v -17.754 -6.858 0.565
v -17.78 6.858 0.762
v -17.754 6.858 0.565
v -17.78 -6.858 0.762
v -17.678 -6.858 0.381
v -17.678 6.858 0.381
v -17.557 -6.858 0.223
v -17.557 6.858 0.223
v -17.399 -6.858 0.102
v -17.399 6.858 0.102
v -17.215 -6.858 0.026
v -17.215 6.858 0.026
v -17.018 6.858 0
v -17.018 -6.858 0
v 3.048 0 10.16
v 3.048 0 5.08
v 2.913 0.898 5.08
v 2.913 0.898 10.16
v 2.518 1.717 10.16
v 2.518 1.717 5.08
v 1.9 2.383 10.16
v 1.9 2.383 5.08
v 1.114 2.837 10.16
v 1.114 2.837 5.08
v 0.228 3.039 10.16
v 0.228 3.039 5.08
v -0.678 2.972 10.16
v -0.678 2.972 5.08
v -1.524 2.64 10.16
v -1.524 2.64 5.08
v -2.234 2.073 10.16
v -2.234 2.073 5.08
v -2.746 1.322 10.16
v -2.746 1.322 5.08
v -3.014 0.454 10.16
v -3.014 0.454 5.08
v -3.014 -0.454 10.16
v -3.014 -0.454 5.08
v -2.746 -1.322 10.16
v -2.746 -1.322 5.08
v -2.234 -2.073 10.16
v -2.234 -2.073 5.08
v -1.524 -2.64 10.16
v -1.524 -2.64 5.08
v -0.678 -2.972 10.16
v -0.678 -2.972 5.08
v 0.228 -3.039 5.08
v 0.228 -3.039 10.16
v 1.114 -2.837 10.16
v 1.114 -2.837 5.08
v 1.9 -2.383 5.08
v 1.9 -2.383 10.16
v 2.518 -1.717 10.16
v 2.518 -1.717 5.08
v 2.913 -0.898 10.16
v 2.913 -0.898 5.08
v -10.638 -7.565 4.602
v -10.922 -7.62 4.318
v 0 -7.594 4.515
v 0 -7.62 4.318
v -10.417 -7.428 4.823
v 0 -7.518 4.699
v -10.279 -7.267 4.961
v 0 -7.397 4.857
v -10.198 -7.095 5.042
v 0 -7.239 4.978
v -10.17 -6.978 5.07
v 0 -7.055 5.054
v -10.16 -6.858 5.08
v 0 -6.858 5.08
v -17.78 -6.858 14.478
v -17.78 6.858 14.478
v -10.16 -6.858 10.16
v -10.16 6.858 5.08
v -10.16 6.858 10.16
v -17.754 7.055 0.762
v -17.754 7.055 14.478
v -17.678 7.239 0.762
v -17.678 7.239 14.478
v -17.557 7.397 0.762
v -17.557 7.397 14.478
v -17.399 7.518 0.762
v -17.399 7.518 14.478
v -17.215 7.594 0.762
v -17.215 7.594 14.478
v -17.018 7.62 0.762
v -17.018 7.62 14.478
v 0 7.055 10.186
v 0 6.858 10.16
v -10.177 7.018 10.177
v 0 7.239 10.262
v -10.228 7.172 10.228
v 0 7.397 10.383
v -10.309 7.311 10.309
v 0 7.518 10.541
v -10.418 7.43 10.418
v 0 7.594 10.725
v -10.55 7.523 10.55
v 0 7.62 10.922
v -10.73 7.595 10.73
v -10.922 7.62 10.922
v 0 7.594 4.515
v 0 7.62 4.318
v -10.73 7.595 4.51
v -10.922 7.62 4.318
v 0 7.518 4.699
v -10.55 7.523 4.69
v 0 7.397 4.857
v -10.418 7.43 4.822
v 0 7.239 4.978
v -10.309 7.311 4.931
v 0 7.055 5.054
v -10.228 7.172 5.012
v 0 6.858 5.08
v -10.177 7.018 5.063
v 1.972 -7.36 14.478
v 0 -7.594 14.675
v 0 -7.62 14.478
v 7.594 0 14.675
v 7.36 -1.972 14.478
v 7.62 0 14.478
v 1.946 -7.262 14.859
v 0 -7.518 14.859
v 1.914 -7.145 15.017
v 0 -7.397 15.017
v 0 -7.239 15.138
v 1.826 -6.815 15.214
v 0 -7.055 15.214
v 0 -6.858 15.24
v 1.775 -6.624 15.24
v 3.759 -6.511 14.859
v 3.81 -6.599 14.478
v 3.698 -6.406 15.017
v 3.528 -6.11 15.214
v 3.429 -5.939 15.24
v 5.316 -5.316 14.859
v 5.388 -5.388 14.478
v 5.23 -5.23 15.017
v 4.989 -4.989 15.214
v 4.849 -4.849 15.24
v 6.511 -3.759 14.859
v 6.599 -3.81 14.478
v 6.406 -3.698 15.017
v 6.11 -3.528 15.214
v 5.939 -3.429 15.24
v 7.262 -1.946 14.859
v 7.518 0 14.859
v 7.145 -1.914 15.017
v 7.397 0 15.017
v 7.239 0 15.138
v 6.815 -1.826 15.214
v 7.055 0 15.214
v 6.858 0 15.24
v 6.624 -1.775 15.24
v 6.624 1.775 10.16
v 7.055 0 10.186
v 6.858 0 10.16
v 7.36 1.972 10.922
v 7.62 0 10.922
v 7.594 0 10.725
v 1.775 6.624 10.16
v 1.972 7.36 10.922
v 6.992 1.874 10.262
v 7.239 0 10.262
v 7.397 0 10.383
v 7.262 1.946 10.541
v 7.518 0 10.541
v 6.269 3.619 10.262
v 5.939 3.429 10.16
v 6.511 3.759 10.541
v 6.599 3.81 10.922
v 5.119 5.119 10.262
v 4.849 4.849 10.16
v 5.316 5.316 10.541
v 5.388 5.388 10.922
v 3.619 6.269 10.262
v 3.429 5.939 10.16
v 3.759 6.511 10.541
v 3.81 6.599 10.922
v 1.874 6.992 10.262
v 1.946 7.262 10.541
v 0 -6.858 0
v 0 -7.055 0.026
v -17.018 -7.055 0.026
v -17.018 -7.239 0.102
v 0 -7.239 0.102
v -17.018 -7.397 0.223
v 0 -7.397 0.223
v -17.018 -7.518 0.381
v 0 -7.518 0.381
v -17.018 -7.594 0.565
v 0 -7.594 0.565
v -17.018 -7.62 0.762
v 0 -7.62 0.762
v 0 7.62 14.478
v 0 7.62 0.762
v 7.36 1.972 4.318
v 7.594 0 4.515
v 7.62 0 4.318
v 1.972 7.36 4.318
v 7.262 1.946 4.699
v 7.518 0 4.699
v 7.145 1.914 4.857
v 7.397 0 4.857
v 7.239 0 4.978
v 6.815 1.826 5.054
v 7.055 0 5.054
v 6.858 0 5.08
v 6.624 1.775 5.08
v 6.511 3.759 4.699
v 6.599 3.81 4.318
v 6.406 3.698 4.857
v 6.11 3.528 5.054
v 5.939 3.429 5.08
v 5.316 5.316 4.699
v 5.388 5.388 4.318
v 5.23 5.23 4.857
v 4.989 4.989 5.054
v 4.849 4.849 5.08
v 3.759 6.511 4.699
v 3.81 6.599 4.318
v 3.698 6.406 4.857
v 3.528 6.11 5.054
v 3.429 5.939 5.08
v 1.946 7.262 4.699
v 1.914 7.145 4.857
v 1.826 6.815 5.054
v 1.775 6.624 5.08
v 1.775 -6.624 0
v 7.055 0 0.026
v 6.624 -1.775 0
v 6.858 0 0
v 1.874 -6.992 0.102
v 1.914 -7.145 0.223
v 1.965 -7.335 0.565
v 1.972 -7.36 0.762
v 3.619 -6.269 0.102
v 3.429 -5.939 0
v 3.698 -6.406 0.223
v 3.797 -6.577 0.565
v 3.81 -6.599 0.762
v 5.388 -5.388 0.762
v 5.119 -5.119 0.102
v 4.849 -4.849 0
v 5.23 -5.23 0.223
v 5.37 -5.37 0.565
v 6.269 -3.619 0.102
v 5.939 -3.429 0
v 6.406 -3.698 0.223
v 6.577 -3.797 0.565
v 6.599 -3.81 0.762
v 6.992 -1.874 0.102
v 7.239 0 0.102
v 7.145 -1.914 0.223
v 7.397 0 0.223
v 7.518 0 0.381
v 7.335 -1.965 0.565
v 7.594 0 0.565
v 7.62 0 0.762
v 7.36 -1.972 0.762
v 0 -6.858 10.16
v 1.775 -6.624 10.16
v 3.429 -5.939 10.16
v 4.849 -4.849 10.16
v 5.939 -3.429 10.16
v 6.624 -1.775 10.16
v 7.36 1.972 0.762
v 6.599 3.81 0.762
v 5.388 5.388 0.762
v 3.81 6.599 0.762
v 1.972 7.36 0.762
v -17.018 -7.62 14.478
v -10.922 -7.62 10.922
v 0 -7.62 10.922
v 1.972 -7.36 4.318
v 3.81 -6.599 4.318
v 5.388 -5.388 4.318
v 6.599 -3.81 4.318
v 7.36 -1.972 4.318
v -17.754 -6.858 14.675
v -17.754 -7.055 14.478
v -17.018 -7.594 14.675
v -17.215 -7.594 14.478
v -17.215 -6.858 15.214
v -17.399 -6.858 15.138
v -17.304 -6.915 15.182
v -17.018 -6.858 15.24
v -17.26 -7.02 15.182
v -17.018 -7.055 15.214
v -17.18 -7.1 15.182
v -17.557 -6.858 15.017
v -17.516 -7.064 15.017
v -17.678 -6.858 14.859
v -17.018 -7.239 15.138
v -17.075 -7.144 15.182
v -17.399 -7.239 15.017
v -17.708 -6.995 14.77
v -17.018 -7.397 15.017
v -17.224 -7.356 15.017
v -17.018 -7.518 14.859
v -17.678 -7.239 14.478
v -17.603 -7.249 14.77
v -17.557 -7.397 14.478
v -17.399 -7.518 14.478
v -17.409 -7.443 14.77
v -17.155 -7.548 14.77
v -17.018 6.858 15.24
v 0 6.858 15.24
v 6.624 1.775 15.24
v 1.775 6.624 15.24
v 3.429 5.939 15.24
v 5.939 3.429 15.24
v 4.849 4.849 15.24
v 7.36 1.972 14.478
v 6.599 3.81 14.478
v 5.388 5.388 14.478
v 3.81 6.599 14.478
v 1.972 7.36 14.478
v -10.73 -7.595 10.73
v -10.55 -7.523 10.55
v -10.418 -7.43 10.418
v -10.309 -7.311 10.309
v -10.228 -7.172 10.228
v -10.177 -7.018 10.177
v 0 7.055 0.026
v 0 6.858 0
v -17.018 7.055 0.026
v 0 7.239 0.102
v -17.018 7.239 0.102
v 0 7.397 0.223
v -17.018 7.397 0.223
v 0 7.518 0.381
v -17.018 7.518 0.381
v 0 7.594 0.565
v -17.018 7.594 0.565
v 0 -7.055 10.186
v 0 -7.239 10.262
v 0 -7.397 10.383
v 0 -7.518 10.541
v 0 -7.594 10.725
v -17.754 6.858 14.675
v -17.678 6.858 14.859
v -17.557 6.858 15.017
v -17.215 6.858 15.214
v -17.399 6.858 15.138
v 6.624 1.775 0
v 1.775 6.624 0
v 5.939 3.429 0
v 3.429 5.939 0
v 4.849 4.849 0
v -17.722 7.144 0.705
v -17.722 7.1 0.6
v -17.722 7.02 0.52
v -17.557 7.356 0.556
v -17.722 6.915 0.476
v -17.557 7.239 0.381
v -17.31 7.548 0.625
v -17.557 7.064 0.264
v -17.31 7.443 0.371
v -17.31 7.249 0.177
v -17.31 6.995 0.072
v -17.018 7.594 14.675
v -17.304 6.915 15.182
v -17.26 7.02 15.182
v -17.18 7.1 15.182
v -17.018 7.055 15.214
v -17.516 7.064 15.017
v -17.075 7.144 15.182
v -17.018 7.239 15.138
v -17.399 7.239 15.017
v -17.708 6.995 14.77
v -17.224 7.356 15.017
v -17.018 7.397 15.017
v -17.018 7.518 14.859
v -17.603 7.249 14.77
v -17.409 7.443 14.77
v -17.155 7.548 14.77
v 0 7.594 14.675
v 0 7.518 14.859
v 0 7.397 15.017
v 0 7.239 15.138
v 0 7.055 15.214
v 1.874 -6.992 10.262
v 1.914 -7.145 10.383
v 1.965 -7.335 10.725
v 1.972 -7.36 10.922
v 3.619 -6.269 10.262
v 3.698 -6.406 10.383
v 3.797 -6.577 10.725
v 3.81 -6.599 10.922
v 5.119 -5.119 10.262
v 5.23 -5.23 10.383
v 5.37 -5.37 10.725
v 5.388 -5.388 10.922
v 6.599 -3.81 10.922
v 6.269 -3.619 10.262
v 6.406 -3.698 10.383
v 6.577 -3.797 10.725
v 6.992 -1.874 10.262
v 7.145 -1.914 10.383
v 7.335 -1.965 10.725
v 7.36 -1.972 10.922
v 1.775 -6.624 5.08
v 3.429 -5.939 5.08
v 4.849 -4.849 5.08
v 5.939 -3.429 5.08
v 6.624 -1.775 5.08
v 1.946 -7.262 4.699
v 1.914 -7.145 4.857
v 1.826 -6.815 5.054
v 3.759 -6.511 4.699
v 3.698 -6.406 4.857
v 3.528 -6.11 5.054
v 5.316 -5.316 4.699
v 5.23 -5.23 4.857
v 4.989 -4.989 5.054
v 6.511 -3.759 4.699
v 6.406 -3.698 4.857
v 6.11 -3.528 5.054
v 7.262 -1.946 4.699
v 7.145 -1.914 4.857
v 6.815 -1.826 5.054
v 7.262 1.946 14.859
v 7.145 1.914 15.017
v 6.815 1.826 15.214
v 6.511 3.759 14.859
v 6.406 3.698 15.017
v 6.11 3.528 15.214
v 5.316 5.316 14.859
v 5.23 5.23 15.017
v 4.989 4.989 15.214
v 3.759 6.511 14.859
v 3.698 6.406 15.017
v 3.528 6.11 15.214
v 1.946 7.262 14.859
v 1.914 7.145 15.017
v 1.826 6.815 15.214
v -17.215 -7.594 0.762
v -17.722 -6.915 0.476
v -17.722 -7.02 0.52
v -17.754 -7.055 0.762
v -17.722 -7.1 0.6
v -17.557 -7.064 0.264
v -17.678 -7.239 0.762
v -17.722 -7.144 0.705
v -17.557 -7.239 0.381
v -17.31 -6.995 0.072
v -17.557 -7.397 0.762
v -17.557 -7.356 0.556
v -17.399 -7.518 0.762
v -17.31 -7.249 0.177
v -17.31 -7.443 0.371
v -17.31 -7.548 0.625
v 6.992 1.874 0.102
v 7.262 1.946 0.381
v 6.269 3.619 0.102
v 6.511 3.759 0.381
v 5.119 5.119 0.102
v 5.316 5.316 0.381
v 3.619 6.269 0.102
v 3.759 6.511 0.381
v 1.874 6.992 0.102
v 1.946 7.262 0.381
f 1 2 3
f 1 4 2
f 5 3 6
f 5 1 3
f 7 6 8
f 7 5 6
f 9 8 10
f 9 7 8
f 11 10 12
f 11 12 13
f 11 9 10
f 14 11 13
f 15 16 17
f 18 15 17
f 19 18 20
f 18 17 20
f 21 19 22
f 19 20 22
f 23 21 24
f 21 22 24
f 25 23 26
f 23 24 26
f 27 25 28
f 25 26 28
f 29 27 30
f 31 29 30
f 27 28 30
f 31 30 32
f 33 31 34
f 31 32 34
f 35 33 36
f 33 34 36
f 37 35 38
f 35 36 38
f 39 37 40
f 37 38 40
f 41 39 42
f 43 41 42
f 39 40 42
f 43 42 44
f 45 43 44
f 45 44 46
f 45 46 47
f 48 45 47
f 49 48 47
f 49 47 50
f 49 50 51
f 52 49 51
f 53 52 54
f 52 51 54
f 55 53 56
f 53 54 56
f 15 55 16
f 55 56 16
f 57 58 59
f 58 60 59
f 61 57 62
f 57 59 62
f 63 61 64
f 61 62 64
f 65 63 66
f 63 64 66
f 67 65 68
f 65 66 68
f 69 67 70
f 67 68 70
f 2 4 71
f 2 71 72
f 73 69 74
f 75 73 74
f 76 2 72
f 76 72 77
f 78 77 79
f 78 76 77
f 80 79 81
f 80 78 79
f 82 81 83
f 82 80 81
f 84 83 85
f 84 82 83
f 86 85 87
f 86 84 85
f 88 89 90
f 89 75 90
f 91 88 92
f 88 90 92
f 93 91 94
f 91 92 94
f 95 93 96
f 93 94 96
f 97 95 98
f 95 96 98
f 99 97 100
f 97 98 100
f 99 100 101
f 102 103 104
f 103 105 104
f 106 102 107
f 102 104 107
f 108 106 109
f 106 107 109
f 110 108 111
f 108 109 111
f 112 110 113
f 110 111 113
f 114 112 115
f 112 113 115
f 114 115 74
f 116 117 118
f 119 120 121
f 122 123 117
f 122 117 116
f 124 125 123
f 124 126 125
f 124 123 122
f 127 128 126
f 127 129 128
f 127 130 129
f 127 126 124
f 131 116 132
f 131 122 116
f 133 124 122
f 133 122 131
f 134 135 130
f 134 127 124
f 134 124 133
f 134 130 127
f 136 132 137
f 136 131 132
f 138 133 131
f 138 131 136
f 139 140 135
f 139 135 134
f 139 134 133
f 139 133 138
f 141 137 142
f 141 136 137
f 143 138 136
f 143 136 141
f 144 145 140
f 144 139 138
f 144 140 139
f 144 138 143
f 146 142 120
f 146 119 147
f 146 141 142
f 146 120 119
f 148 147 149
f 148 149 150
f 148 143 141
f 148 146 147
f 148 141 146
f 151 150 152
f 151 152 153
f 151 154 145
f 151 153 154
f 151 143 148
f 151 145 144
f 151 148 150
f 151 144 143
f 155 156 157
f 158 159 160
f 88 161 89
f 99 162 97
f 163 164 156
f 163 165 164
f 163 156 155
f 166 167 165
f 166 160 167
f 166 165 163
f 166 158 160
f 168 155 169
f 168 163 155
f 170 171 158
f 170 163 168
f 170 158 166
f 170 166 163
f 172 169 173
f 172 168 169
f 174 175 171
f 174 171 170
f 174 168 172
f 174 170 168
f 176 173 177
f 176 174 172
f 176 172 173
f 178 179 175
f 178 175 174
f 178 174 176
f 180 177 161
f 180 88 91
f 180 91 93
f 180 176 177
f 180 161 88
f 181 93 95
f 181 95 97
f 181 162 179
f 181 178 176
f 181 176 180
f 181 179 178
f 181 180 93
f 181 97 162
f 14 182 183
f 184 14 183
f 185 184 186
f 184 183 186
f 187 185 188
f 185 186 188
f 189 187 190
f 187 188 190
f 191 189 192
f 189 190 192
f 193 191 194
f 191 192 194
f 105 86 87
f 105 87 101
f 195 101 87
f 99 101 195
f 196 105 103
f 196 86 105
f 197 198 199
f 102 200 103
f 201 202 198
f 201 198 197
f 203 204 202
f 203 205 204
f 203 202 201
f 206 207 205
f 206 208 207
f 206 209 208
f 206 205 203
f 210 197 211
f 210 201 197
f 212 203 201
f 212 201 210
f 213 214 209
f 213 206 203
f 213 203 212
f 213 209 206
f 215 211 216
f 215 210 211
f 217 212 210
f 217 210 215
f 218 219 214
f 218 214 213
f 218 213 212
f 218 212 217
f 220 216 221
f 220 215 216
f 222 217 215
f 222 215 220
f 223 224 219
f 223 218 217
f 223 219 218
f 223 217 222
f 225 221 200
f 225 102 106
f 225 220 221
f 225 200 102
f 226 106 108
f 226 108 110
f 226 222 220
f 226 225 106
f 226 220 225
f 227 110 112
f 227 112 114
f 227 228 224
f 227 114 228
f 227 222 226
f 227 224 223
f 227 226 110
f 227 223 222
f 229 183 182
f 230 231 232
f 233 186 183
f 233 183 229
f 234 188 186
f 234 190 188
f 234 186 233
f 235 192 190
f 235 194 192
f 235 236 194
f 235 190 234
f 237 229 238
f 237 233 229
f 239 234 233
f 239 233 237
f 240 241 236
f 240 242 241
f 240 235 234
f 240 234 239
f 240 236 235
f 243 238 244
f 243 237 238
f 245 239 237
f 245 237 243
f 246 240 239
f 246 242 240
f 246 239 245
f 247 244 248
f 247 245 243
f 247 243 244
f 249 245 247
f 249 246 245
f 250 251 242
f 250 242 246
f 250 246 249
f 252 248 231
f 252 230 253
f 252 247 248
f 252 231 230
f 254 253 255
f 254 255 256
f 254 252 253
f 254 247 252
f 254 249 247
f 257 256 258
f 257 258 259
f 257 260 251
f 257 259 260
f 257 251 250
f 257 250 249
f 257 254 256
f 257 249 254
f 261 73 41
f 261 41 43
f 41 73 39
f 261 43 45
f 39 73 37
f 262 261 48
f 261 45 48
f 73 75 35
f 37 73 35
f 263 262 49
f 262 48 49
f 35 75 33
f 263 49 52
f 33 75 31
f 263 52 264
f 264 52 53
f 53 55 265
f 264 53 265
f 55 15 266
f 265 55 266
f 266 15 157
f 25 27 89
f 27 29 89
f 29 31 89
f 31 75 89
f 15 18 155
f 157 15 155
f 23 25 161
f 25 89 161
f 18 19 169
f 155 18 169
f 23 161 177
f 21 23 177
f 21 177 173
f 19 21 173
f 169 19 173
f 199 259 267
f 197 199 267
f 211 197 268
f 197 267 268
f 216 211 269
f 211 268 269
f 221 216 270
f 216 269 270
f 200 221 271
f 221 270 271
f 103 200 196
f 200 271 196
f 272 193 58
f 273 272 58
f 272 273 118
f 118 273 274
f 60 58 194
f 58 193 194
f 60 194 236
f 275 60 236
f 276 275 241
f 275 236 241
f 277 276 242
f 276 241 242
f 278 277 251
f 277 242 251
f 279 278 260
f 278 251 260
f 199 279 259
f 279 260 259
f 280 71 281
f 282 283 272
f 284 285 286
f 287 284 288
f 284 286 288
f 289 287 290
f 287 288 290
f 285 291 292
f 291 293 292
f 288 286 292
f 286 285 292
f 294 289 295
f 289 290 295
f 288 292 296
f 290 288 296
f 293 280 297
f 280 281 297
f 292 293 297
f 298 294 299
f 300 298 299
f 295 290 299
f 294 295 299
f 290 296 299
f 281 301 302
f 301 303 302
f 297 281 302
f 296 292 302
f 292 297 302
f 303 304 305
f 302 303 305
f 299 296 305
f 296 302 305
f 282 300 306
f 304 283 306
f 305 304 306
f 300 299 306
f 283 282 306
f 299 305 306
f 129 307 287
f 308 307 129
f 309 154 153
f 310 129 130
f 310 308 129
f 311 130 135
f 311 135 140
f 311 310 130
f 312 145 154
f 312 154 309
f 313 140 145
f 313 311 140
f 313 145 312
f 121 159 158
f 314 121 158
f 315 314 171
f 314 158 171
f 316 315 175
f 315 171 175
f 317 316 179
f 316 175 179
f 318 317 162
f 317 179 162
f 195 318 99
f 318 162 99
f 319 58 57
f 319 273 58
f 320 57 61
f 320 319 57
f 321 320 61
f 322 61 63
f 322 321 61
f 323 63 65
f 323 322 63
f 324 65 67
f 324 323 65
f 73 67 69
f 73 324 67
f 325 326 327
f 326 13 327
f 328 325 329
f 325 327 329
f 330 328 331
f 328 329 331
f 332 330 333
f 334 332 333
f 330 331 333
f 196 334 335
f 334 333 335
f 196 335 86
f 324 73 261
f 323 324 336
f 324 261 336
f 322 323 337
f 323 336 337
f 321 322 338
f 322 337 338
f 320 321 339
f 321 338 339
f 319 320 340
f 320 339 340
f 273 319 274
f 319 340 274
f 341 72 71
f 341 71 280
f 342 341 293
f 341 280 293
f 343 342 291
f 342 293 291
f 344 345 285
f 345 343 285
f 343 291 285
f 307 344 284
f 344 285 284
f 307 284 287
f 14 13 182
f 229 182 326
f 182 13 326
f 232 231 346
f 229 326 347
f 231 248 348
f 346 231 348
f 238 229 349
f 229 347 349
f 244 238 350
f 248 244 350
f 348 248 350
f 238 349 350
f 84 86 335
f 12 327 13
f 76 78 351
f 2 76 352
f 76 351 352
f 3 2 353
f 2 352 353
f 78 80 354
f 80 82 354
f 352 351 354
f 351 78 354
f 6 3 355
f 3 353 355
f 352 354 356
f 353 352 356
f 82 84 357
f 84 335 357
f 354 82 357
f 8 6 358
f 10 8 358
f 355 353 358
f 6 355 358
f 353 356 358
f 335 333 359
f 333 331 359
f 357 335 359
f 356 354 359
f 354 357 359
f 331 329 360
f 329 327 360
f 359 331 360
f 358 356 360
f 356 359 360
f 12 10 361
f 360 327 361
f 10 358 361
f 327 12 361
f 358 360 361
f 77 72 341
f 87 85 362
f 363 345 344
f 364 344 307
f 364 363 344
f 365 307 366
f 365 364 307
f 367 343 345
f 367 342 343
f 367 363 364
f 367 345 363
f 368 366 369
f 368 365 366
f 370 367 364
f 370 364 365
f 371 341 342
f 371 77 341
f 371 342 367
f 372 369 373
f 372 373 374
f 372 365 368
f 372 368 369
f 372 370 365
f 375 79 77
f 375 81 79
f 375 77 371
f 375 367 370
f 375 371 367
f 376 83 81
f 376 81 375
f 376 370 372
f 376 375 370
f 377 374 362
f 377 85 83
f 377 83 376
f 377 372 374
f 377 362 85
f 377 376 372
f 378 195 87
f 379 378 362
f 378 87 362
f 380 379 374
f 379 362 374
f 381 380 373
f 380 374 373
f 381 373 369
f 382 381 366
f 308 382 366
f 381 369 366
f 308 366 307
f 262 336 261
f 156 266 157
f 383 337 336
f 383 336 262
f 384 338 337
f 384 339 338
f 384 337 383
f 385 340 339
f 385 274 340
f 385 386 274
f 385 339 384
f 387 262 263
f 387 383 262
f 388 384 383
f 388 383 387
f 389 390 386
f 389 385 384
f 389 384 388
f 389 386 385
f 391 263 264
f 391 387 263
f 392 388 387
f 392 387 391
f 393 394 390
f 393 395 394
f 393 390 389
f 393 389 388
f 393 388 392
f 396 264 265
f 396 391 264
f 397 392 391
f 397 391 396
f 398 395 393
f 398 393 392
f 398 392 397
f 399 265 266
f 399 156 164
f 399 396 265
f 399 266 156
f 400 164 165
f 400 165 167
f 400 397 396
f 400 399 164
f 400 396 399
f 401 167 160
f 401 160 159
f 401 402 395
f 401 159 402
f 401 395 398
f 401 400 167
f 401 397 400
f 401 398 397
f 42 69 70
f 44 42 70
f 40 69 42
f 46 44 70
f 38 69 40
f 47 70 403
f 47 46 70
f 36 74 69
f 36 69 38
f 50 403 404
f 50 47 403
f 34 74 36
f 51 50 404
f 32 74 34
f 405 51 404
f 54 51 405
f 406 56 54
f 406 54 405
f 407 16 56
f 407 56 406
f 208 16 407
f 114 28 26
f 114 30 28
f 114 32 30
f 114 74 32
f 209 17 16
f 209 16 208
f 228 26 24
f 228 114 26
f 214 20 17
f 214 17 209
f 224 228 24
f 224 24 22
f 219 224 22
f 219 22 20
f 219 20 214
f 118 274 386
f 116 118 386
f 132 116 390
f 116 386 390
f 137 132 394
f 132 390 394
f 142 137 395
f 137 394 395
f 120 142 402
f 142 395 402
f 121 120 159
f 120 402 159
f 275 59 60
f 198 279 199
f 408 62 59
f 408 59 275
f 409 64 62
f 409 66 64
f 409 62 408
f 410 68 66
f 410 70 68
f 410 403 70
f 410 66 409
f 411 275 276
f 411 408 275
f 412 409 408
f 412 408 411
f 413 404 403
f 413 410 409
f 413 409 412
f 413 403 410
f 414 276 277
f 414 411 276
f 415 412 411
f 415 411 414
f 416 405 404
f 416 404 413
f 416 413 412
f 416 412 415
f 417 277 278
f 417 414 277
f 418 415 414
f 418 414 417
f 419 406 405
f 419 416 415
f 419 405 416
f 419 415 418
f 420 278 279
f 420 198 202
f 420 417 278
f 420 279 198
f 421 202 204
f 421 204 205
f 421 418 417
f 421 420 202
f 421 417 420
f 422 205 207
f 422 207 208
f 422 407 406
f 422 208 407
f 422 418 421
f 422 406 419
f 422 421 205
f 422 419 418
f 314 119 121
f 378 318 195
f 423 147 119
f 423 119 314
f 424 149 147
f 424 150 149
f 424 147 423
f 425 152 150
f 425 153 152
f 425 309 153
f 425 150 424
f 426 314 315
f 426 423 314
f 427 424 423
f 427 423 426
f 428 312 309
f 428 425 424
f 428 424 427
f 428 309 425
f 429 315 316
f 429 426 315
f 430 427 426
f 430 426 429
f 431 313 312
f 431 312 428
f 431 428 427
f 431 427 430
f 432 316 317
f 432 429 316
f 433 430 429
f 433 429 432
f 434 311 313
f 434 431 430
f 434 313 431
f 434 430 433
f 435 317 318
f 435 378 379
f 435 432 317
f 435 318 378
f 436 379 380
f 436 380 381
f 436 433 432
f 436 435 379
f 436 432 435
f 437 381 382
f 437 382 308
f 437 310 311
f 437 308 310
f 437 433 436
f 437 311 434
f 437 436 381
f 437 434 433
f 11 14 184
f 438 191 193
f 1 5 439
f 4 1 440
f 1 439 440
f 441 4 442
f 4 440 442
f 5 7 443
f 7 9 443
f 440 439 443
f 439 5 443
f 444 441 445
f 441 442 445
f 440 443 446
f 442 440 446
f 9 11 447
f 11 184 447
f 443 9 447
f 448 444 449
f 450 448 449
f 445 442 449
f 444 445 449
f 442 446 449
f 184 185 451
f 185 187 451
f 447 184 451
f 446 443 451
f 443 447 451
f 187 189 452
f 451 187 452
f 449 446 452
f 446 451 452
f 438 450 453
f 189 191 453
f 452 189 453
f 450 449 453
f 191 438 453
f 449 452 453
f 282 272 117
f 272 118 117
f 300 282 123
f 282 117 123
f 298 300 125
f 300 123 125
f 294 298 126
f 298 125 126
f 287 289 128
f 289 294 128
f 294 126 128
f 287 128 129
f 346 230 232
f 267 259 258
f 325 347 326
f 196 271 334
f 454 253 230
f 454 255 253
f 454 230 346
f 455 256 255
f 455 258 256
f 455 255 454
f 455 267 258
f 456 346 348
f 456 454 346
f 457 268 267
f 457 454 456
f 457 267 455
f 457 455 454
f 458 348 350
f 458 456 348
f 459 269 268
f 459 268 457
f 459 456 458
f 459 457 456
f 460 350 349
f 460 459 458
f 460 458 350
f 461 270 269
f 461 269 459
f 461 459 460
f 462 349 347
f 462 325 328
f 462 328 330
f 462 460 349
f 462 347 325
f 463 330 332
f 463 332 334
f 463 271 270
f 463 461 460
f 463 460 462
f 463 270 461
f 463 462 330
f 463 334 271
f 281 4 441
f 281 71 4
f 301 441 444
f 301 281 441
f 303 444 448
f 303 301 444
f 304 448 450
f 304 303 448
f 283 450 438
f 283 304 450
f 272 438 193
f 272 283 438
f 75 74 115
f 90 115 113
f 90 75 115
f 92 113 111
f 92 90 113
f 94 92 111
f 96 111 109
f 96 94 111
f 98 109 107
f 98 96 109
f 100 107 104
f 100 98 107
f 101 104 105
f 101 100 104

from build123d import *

# Parameters (mm, degrees)
F1_DEPTH = 5.08
F2_R     = 3.048
F3_DEPTH = 5.08
F5_DEPTH = 5.08
F6_W     = 7.62
F6_H     = 15.24
F7_DEPTH = 5.08
F8_R     = 0.762


# Not quite as in the source:
# - a feature names something its author has since deleted; it is built from what else it names


with BuildPart() as f1:
    # F0 (on Top) → F1 (new body)
    with BuildSketch(Plane.XY):
        with BuildLine():
            ThreePointArc((0, -7.62), (-7.62, 0), (0, 7.62))
            Line((0, 7.62), (-17.78, 7.62))
            Line((-17.78, 7.62), (-17.78, -7.62))
            Line((-17.78, -7.62), (0, -7.62))
        make_face()
        with BuildLine():
            Line((0, -7.62), (0, 7.62))
            ThreePointArc((0, 7.62), (-7.62, 0), (0, -7.62))
        make_face()
        with BuildLine():
            ThreePointArc((0, -7.62), (5.3881536726, -5.3881536726), (7.62, 0))
            ThreePointArc((7.62, 0), (5.3881536726, 5.3881536726), (0, 7.62))
            Line((0, 7.62), (0, -7.62))
        make_face()
    extrude(amount=F1_DEPTH)

    # F2 (on face) → F3 (join)
    with BuildSketch(Plane.XY.offset(5.08)):
        Circle(F2_R)
    extrude(amount=F3_DEPTH)

    # F4 (on face) → F5 (join)
    with BuildSketch(Plane.XY.offset(10.16)):
        with BuildLine():
            ThreePointArc((0, -7.62), (5.3881536726, -5.3881536726), (7.62, 0))
            ThreePointArc((7.62, 0), (5.3881536726, 5.3881536726), (0, 7.62))
            Line((0, 7.62), (0, 3.048))
            ThreePointArc((0, 3.048), (2.1552614691, 2.1552614691), (3.048, 0))
            ThreePointArc((3.048, 0), (2.1552614691, -2.1552614691), (0, -3.048))
            Line((0, -3.048), (0, -7.62))
        make_face()
        with BuildLine():
            Line((0, 3.048), (0, 7.62))
            ThreePointArc((0, 7.62), (-7.62, 0), (0, -7.62))
            Line((0, -7.62), (0, -3.048))
            ThreePointArc((0, -3.048), (-3.048, 0), (0, 3.048))
        make_face()
        with BuildLine():
            ThreePointArc((0, -7.62), (-7.62, 0), (0, 7.62))
            Line((0, 7.62), (-17.78, 7.62))
            Line((-17.78, 7.62), (-17.78, -7.62))
            Line((-17.78, -7.62), (0, -7.62))
        make_face()
        with BuildLine():
            ThreePointArc((0, -7.62), (5.3881536726, -5.3881536726), (7.62, 0))
            ThreePointArc((7.62, 0), (5.3881536726, 5.3881536726), (0, 7.62))
            Line((0, 7.62), (0, -7.62))
        make_face()
        with BuildLine():
            Line((0, -7.62), (0, 7.62))
            ThreePointArc((0, 7.62), (-7.62, 0), (0, -7.62))
        make_face()
    extrude(amount=F5_DEPTH)

    # F6 (on face) → F7 (join)
    with BuildSketch(Plane.XY.offset(5.08)):
        with Locations((-13.97, 0)):
            Rectangle(F6_W, F6_H)
    extrude(amount=F7_DEPTH)

    # F8
    f8_edges = [f1.edges().sort_by_distance(p)[0] for p in [
        (-8.89, 7.62, 0),
        (7.62, 0, 0),
        (-8.89, -7.62, 0),
        (7.62, 0, 15.24),
        (-17.78, 7.62, 7.62),
        (-17.78, 0, 0),
        (-17.78, -7.62, 7.62),
        (-17.78, 0, 15.24),
        (7.62, 0, 5.08),
        (7.62, 0, 10.16),
        (-10.16, -7.62, 7.62),
        (-10.16, 7.62, 7.62),
        (-8.89, 7.62, 15.24),
        (-8.89, -7.62, 15.24),
        (-5.08, -7.62, 5.08),
        (-5.08, 7.62, 5.08),
        (-5.08, -7.62, 10.16),
        (-5.08, 7.62, 10.16),
    ]]
    fillet(f8_edges, radius=F8_R)


solid = f1.part
